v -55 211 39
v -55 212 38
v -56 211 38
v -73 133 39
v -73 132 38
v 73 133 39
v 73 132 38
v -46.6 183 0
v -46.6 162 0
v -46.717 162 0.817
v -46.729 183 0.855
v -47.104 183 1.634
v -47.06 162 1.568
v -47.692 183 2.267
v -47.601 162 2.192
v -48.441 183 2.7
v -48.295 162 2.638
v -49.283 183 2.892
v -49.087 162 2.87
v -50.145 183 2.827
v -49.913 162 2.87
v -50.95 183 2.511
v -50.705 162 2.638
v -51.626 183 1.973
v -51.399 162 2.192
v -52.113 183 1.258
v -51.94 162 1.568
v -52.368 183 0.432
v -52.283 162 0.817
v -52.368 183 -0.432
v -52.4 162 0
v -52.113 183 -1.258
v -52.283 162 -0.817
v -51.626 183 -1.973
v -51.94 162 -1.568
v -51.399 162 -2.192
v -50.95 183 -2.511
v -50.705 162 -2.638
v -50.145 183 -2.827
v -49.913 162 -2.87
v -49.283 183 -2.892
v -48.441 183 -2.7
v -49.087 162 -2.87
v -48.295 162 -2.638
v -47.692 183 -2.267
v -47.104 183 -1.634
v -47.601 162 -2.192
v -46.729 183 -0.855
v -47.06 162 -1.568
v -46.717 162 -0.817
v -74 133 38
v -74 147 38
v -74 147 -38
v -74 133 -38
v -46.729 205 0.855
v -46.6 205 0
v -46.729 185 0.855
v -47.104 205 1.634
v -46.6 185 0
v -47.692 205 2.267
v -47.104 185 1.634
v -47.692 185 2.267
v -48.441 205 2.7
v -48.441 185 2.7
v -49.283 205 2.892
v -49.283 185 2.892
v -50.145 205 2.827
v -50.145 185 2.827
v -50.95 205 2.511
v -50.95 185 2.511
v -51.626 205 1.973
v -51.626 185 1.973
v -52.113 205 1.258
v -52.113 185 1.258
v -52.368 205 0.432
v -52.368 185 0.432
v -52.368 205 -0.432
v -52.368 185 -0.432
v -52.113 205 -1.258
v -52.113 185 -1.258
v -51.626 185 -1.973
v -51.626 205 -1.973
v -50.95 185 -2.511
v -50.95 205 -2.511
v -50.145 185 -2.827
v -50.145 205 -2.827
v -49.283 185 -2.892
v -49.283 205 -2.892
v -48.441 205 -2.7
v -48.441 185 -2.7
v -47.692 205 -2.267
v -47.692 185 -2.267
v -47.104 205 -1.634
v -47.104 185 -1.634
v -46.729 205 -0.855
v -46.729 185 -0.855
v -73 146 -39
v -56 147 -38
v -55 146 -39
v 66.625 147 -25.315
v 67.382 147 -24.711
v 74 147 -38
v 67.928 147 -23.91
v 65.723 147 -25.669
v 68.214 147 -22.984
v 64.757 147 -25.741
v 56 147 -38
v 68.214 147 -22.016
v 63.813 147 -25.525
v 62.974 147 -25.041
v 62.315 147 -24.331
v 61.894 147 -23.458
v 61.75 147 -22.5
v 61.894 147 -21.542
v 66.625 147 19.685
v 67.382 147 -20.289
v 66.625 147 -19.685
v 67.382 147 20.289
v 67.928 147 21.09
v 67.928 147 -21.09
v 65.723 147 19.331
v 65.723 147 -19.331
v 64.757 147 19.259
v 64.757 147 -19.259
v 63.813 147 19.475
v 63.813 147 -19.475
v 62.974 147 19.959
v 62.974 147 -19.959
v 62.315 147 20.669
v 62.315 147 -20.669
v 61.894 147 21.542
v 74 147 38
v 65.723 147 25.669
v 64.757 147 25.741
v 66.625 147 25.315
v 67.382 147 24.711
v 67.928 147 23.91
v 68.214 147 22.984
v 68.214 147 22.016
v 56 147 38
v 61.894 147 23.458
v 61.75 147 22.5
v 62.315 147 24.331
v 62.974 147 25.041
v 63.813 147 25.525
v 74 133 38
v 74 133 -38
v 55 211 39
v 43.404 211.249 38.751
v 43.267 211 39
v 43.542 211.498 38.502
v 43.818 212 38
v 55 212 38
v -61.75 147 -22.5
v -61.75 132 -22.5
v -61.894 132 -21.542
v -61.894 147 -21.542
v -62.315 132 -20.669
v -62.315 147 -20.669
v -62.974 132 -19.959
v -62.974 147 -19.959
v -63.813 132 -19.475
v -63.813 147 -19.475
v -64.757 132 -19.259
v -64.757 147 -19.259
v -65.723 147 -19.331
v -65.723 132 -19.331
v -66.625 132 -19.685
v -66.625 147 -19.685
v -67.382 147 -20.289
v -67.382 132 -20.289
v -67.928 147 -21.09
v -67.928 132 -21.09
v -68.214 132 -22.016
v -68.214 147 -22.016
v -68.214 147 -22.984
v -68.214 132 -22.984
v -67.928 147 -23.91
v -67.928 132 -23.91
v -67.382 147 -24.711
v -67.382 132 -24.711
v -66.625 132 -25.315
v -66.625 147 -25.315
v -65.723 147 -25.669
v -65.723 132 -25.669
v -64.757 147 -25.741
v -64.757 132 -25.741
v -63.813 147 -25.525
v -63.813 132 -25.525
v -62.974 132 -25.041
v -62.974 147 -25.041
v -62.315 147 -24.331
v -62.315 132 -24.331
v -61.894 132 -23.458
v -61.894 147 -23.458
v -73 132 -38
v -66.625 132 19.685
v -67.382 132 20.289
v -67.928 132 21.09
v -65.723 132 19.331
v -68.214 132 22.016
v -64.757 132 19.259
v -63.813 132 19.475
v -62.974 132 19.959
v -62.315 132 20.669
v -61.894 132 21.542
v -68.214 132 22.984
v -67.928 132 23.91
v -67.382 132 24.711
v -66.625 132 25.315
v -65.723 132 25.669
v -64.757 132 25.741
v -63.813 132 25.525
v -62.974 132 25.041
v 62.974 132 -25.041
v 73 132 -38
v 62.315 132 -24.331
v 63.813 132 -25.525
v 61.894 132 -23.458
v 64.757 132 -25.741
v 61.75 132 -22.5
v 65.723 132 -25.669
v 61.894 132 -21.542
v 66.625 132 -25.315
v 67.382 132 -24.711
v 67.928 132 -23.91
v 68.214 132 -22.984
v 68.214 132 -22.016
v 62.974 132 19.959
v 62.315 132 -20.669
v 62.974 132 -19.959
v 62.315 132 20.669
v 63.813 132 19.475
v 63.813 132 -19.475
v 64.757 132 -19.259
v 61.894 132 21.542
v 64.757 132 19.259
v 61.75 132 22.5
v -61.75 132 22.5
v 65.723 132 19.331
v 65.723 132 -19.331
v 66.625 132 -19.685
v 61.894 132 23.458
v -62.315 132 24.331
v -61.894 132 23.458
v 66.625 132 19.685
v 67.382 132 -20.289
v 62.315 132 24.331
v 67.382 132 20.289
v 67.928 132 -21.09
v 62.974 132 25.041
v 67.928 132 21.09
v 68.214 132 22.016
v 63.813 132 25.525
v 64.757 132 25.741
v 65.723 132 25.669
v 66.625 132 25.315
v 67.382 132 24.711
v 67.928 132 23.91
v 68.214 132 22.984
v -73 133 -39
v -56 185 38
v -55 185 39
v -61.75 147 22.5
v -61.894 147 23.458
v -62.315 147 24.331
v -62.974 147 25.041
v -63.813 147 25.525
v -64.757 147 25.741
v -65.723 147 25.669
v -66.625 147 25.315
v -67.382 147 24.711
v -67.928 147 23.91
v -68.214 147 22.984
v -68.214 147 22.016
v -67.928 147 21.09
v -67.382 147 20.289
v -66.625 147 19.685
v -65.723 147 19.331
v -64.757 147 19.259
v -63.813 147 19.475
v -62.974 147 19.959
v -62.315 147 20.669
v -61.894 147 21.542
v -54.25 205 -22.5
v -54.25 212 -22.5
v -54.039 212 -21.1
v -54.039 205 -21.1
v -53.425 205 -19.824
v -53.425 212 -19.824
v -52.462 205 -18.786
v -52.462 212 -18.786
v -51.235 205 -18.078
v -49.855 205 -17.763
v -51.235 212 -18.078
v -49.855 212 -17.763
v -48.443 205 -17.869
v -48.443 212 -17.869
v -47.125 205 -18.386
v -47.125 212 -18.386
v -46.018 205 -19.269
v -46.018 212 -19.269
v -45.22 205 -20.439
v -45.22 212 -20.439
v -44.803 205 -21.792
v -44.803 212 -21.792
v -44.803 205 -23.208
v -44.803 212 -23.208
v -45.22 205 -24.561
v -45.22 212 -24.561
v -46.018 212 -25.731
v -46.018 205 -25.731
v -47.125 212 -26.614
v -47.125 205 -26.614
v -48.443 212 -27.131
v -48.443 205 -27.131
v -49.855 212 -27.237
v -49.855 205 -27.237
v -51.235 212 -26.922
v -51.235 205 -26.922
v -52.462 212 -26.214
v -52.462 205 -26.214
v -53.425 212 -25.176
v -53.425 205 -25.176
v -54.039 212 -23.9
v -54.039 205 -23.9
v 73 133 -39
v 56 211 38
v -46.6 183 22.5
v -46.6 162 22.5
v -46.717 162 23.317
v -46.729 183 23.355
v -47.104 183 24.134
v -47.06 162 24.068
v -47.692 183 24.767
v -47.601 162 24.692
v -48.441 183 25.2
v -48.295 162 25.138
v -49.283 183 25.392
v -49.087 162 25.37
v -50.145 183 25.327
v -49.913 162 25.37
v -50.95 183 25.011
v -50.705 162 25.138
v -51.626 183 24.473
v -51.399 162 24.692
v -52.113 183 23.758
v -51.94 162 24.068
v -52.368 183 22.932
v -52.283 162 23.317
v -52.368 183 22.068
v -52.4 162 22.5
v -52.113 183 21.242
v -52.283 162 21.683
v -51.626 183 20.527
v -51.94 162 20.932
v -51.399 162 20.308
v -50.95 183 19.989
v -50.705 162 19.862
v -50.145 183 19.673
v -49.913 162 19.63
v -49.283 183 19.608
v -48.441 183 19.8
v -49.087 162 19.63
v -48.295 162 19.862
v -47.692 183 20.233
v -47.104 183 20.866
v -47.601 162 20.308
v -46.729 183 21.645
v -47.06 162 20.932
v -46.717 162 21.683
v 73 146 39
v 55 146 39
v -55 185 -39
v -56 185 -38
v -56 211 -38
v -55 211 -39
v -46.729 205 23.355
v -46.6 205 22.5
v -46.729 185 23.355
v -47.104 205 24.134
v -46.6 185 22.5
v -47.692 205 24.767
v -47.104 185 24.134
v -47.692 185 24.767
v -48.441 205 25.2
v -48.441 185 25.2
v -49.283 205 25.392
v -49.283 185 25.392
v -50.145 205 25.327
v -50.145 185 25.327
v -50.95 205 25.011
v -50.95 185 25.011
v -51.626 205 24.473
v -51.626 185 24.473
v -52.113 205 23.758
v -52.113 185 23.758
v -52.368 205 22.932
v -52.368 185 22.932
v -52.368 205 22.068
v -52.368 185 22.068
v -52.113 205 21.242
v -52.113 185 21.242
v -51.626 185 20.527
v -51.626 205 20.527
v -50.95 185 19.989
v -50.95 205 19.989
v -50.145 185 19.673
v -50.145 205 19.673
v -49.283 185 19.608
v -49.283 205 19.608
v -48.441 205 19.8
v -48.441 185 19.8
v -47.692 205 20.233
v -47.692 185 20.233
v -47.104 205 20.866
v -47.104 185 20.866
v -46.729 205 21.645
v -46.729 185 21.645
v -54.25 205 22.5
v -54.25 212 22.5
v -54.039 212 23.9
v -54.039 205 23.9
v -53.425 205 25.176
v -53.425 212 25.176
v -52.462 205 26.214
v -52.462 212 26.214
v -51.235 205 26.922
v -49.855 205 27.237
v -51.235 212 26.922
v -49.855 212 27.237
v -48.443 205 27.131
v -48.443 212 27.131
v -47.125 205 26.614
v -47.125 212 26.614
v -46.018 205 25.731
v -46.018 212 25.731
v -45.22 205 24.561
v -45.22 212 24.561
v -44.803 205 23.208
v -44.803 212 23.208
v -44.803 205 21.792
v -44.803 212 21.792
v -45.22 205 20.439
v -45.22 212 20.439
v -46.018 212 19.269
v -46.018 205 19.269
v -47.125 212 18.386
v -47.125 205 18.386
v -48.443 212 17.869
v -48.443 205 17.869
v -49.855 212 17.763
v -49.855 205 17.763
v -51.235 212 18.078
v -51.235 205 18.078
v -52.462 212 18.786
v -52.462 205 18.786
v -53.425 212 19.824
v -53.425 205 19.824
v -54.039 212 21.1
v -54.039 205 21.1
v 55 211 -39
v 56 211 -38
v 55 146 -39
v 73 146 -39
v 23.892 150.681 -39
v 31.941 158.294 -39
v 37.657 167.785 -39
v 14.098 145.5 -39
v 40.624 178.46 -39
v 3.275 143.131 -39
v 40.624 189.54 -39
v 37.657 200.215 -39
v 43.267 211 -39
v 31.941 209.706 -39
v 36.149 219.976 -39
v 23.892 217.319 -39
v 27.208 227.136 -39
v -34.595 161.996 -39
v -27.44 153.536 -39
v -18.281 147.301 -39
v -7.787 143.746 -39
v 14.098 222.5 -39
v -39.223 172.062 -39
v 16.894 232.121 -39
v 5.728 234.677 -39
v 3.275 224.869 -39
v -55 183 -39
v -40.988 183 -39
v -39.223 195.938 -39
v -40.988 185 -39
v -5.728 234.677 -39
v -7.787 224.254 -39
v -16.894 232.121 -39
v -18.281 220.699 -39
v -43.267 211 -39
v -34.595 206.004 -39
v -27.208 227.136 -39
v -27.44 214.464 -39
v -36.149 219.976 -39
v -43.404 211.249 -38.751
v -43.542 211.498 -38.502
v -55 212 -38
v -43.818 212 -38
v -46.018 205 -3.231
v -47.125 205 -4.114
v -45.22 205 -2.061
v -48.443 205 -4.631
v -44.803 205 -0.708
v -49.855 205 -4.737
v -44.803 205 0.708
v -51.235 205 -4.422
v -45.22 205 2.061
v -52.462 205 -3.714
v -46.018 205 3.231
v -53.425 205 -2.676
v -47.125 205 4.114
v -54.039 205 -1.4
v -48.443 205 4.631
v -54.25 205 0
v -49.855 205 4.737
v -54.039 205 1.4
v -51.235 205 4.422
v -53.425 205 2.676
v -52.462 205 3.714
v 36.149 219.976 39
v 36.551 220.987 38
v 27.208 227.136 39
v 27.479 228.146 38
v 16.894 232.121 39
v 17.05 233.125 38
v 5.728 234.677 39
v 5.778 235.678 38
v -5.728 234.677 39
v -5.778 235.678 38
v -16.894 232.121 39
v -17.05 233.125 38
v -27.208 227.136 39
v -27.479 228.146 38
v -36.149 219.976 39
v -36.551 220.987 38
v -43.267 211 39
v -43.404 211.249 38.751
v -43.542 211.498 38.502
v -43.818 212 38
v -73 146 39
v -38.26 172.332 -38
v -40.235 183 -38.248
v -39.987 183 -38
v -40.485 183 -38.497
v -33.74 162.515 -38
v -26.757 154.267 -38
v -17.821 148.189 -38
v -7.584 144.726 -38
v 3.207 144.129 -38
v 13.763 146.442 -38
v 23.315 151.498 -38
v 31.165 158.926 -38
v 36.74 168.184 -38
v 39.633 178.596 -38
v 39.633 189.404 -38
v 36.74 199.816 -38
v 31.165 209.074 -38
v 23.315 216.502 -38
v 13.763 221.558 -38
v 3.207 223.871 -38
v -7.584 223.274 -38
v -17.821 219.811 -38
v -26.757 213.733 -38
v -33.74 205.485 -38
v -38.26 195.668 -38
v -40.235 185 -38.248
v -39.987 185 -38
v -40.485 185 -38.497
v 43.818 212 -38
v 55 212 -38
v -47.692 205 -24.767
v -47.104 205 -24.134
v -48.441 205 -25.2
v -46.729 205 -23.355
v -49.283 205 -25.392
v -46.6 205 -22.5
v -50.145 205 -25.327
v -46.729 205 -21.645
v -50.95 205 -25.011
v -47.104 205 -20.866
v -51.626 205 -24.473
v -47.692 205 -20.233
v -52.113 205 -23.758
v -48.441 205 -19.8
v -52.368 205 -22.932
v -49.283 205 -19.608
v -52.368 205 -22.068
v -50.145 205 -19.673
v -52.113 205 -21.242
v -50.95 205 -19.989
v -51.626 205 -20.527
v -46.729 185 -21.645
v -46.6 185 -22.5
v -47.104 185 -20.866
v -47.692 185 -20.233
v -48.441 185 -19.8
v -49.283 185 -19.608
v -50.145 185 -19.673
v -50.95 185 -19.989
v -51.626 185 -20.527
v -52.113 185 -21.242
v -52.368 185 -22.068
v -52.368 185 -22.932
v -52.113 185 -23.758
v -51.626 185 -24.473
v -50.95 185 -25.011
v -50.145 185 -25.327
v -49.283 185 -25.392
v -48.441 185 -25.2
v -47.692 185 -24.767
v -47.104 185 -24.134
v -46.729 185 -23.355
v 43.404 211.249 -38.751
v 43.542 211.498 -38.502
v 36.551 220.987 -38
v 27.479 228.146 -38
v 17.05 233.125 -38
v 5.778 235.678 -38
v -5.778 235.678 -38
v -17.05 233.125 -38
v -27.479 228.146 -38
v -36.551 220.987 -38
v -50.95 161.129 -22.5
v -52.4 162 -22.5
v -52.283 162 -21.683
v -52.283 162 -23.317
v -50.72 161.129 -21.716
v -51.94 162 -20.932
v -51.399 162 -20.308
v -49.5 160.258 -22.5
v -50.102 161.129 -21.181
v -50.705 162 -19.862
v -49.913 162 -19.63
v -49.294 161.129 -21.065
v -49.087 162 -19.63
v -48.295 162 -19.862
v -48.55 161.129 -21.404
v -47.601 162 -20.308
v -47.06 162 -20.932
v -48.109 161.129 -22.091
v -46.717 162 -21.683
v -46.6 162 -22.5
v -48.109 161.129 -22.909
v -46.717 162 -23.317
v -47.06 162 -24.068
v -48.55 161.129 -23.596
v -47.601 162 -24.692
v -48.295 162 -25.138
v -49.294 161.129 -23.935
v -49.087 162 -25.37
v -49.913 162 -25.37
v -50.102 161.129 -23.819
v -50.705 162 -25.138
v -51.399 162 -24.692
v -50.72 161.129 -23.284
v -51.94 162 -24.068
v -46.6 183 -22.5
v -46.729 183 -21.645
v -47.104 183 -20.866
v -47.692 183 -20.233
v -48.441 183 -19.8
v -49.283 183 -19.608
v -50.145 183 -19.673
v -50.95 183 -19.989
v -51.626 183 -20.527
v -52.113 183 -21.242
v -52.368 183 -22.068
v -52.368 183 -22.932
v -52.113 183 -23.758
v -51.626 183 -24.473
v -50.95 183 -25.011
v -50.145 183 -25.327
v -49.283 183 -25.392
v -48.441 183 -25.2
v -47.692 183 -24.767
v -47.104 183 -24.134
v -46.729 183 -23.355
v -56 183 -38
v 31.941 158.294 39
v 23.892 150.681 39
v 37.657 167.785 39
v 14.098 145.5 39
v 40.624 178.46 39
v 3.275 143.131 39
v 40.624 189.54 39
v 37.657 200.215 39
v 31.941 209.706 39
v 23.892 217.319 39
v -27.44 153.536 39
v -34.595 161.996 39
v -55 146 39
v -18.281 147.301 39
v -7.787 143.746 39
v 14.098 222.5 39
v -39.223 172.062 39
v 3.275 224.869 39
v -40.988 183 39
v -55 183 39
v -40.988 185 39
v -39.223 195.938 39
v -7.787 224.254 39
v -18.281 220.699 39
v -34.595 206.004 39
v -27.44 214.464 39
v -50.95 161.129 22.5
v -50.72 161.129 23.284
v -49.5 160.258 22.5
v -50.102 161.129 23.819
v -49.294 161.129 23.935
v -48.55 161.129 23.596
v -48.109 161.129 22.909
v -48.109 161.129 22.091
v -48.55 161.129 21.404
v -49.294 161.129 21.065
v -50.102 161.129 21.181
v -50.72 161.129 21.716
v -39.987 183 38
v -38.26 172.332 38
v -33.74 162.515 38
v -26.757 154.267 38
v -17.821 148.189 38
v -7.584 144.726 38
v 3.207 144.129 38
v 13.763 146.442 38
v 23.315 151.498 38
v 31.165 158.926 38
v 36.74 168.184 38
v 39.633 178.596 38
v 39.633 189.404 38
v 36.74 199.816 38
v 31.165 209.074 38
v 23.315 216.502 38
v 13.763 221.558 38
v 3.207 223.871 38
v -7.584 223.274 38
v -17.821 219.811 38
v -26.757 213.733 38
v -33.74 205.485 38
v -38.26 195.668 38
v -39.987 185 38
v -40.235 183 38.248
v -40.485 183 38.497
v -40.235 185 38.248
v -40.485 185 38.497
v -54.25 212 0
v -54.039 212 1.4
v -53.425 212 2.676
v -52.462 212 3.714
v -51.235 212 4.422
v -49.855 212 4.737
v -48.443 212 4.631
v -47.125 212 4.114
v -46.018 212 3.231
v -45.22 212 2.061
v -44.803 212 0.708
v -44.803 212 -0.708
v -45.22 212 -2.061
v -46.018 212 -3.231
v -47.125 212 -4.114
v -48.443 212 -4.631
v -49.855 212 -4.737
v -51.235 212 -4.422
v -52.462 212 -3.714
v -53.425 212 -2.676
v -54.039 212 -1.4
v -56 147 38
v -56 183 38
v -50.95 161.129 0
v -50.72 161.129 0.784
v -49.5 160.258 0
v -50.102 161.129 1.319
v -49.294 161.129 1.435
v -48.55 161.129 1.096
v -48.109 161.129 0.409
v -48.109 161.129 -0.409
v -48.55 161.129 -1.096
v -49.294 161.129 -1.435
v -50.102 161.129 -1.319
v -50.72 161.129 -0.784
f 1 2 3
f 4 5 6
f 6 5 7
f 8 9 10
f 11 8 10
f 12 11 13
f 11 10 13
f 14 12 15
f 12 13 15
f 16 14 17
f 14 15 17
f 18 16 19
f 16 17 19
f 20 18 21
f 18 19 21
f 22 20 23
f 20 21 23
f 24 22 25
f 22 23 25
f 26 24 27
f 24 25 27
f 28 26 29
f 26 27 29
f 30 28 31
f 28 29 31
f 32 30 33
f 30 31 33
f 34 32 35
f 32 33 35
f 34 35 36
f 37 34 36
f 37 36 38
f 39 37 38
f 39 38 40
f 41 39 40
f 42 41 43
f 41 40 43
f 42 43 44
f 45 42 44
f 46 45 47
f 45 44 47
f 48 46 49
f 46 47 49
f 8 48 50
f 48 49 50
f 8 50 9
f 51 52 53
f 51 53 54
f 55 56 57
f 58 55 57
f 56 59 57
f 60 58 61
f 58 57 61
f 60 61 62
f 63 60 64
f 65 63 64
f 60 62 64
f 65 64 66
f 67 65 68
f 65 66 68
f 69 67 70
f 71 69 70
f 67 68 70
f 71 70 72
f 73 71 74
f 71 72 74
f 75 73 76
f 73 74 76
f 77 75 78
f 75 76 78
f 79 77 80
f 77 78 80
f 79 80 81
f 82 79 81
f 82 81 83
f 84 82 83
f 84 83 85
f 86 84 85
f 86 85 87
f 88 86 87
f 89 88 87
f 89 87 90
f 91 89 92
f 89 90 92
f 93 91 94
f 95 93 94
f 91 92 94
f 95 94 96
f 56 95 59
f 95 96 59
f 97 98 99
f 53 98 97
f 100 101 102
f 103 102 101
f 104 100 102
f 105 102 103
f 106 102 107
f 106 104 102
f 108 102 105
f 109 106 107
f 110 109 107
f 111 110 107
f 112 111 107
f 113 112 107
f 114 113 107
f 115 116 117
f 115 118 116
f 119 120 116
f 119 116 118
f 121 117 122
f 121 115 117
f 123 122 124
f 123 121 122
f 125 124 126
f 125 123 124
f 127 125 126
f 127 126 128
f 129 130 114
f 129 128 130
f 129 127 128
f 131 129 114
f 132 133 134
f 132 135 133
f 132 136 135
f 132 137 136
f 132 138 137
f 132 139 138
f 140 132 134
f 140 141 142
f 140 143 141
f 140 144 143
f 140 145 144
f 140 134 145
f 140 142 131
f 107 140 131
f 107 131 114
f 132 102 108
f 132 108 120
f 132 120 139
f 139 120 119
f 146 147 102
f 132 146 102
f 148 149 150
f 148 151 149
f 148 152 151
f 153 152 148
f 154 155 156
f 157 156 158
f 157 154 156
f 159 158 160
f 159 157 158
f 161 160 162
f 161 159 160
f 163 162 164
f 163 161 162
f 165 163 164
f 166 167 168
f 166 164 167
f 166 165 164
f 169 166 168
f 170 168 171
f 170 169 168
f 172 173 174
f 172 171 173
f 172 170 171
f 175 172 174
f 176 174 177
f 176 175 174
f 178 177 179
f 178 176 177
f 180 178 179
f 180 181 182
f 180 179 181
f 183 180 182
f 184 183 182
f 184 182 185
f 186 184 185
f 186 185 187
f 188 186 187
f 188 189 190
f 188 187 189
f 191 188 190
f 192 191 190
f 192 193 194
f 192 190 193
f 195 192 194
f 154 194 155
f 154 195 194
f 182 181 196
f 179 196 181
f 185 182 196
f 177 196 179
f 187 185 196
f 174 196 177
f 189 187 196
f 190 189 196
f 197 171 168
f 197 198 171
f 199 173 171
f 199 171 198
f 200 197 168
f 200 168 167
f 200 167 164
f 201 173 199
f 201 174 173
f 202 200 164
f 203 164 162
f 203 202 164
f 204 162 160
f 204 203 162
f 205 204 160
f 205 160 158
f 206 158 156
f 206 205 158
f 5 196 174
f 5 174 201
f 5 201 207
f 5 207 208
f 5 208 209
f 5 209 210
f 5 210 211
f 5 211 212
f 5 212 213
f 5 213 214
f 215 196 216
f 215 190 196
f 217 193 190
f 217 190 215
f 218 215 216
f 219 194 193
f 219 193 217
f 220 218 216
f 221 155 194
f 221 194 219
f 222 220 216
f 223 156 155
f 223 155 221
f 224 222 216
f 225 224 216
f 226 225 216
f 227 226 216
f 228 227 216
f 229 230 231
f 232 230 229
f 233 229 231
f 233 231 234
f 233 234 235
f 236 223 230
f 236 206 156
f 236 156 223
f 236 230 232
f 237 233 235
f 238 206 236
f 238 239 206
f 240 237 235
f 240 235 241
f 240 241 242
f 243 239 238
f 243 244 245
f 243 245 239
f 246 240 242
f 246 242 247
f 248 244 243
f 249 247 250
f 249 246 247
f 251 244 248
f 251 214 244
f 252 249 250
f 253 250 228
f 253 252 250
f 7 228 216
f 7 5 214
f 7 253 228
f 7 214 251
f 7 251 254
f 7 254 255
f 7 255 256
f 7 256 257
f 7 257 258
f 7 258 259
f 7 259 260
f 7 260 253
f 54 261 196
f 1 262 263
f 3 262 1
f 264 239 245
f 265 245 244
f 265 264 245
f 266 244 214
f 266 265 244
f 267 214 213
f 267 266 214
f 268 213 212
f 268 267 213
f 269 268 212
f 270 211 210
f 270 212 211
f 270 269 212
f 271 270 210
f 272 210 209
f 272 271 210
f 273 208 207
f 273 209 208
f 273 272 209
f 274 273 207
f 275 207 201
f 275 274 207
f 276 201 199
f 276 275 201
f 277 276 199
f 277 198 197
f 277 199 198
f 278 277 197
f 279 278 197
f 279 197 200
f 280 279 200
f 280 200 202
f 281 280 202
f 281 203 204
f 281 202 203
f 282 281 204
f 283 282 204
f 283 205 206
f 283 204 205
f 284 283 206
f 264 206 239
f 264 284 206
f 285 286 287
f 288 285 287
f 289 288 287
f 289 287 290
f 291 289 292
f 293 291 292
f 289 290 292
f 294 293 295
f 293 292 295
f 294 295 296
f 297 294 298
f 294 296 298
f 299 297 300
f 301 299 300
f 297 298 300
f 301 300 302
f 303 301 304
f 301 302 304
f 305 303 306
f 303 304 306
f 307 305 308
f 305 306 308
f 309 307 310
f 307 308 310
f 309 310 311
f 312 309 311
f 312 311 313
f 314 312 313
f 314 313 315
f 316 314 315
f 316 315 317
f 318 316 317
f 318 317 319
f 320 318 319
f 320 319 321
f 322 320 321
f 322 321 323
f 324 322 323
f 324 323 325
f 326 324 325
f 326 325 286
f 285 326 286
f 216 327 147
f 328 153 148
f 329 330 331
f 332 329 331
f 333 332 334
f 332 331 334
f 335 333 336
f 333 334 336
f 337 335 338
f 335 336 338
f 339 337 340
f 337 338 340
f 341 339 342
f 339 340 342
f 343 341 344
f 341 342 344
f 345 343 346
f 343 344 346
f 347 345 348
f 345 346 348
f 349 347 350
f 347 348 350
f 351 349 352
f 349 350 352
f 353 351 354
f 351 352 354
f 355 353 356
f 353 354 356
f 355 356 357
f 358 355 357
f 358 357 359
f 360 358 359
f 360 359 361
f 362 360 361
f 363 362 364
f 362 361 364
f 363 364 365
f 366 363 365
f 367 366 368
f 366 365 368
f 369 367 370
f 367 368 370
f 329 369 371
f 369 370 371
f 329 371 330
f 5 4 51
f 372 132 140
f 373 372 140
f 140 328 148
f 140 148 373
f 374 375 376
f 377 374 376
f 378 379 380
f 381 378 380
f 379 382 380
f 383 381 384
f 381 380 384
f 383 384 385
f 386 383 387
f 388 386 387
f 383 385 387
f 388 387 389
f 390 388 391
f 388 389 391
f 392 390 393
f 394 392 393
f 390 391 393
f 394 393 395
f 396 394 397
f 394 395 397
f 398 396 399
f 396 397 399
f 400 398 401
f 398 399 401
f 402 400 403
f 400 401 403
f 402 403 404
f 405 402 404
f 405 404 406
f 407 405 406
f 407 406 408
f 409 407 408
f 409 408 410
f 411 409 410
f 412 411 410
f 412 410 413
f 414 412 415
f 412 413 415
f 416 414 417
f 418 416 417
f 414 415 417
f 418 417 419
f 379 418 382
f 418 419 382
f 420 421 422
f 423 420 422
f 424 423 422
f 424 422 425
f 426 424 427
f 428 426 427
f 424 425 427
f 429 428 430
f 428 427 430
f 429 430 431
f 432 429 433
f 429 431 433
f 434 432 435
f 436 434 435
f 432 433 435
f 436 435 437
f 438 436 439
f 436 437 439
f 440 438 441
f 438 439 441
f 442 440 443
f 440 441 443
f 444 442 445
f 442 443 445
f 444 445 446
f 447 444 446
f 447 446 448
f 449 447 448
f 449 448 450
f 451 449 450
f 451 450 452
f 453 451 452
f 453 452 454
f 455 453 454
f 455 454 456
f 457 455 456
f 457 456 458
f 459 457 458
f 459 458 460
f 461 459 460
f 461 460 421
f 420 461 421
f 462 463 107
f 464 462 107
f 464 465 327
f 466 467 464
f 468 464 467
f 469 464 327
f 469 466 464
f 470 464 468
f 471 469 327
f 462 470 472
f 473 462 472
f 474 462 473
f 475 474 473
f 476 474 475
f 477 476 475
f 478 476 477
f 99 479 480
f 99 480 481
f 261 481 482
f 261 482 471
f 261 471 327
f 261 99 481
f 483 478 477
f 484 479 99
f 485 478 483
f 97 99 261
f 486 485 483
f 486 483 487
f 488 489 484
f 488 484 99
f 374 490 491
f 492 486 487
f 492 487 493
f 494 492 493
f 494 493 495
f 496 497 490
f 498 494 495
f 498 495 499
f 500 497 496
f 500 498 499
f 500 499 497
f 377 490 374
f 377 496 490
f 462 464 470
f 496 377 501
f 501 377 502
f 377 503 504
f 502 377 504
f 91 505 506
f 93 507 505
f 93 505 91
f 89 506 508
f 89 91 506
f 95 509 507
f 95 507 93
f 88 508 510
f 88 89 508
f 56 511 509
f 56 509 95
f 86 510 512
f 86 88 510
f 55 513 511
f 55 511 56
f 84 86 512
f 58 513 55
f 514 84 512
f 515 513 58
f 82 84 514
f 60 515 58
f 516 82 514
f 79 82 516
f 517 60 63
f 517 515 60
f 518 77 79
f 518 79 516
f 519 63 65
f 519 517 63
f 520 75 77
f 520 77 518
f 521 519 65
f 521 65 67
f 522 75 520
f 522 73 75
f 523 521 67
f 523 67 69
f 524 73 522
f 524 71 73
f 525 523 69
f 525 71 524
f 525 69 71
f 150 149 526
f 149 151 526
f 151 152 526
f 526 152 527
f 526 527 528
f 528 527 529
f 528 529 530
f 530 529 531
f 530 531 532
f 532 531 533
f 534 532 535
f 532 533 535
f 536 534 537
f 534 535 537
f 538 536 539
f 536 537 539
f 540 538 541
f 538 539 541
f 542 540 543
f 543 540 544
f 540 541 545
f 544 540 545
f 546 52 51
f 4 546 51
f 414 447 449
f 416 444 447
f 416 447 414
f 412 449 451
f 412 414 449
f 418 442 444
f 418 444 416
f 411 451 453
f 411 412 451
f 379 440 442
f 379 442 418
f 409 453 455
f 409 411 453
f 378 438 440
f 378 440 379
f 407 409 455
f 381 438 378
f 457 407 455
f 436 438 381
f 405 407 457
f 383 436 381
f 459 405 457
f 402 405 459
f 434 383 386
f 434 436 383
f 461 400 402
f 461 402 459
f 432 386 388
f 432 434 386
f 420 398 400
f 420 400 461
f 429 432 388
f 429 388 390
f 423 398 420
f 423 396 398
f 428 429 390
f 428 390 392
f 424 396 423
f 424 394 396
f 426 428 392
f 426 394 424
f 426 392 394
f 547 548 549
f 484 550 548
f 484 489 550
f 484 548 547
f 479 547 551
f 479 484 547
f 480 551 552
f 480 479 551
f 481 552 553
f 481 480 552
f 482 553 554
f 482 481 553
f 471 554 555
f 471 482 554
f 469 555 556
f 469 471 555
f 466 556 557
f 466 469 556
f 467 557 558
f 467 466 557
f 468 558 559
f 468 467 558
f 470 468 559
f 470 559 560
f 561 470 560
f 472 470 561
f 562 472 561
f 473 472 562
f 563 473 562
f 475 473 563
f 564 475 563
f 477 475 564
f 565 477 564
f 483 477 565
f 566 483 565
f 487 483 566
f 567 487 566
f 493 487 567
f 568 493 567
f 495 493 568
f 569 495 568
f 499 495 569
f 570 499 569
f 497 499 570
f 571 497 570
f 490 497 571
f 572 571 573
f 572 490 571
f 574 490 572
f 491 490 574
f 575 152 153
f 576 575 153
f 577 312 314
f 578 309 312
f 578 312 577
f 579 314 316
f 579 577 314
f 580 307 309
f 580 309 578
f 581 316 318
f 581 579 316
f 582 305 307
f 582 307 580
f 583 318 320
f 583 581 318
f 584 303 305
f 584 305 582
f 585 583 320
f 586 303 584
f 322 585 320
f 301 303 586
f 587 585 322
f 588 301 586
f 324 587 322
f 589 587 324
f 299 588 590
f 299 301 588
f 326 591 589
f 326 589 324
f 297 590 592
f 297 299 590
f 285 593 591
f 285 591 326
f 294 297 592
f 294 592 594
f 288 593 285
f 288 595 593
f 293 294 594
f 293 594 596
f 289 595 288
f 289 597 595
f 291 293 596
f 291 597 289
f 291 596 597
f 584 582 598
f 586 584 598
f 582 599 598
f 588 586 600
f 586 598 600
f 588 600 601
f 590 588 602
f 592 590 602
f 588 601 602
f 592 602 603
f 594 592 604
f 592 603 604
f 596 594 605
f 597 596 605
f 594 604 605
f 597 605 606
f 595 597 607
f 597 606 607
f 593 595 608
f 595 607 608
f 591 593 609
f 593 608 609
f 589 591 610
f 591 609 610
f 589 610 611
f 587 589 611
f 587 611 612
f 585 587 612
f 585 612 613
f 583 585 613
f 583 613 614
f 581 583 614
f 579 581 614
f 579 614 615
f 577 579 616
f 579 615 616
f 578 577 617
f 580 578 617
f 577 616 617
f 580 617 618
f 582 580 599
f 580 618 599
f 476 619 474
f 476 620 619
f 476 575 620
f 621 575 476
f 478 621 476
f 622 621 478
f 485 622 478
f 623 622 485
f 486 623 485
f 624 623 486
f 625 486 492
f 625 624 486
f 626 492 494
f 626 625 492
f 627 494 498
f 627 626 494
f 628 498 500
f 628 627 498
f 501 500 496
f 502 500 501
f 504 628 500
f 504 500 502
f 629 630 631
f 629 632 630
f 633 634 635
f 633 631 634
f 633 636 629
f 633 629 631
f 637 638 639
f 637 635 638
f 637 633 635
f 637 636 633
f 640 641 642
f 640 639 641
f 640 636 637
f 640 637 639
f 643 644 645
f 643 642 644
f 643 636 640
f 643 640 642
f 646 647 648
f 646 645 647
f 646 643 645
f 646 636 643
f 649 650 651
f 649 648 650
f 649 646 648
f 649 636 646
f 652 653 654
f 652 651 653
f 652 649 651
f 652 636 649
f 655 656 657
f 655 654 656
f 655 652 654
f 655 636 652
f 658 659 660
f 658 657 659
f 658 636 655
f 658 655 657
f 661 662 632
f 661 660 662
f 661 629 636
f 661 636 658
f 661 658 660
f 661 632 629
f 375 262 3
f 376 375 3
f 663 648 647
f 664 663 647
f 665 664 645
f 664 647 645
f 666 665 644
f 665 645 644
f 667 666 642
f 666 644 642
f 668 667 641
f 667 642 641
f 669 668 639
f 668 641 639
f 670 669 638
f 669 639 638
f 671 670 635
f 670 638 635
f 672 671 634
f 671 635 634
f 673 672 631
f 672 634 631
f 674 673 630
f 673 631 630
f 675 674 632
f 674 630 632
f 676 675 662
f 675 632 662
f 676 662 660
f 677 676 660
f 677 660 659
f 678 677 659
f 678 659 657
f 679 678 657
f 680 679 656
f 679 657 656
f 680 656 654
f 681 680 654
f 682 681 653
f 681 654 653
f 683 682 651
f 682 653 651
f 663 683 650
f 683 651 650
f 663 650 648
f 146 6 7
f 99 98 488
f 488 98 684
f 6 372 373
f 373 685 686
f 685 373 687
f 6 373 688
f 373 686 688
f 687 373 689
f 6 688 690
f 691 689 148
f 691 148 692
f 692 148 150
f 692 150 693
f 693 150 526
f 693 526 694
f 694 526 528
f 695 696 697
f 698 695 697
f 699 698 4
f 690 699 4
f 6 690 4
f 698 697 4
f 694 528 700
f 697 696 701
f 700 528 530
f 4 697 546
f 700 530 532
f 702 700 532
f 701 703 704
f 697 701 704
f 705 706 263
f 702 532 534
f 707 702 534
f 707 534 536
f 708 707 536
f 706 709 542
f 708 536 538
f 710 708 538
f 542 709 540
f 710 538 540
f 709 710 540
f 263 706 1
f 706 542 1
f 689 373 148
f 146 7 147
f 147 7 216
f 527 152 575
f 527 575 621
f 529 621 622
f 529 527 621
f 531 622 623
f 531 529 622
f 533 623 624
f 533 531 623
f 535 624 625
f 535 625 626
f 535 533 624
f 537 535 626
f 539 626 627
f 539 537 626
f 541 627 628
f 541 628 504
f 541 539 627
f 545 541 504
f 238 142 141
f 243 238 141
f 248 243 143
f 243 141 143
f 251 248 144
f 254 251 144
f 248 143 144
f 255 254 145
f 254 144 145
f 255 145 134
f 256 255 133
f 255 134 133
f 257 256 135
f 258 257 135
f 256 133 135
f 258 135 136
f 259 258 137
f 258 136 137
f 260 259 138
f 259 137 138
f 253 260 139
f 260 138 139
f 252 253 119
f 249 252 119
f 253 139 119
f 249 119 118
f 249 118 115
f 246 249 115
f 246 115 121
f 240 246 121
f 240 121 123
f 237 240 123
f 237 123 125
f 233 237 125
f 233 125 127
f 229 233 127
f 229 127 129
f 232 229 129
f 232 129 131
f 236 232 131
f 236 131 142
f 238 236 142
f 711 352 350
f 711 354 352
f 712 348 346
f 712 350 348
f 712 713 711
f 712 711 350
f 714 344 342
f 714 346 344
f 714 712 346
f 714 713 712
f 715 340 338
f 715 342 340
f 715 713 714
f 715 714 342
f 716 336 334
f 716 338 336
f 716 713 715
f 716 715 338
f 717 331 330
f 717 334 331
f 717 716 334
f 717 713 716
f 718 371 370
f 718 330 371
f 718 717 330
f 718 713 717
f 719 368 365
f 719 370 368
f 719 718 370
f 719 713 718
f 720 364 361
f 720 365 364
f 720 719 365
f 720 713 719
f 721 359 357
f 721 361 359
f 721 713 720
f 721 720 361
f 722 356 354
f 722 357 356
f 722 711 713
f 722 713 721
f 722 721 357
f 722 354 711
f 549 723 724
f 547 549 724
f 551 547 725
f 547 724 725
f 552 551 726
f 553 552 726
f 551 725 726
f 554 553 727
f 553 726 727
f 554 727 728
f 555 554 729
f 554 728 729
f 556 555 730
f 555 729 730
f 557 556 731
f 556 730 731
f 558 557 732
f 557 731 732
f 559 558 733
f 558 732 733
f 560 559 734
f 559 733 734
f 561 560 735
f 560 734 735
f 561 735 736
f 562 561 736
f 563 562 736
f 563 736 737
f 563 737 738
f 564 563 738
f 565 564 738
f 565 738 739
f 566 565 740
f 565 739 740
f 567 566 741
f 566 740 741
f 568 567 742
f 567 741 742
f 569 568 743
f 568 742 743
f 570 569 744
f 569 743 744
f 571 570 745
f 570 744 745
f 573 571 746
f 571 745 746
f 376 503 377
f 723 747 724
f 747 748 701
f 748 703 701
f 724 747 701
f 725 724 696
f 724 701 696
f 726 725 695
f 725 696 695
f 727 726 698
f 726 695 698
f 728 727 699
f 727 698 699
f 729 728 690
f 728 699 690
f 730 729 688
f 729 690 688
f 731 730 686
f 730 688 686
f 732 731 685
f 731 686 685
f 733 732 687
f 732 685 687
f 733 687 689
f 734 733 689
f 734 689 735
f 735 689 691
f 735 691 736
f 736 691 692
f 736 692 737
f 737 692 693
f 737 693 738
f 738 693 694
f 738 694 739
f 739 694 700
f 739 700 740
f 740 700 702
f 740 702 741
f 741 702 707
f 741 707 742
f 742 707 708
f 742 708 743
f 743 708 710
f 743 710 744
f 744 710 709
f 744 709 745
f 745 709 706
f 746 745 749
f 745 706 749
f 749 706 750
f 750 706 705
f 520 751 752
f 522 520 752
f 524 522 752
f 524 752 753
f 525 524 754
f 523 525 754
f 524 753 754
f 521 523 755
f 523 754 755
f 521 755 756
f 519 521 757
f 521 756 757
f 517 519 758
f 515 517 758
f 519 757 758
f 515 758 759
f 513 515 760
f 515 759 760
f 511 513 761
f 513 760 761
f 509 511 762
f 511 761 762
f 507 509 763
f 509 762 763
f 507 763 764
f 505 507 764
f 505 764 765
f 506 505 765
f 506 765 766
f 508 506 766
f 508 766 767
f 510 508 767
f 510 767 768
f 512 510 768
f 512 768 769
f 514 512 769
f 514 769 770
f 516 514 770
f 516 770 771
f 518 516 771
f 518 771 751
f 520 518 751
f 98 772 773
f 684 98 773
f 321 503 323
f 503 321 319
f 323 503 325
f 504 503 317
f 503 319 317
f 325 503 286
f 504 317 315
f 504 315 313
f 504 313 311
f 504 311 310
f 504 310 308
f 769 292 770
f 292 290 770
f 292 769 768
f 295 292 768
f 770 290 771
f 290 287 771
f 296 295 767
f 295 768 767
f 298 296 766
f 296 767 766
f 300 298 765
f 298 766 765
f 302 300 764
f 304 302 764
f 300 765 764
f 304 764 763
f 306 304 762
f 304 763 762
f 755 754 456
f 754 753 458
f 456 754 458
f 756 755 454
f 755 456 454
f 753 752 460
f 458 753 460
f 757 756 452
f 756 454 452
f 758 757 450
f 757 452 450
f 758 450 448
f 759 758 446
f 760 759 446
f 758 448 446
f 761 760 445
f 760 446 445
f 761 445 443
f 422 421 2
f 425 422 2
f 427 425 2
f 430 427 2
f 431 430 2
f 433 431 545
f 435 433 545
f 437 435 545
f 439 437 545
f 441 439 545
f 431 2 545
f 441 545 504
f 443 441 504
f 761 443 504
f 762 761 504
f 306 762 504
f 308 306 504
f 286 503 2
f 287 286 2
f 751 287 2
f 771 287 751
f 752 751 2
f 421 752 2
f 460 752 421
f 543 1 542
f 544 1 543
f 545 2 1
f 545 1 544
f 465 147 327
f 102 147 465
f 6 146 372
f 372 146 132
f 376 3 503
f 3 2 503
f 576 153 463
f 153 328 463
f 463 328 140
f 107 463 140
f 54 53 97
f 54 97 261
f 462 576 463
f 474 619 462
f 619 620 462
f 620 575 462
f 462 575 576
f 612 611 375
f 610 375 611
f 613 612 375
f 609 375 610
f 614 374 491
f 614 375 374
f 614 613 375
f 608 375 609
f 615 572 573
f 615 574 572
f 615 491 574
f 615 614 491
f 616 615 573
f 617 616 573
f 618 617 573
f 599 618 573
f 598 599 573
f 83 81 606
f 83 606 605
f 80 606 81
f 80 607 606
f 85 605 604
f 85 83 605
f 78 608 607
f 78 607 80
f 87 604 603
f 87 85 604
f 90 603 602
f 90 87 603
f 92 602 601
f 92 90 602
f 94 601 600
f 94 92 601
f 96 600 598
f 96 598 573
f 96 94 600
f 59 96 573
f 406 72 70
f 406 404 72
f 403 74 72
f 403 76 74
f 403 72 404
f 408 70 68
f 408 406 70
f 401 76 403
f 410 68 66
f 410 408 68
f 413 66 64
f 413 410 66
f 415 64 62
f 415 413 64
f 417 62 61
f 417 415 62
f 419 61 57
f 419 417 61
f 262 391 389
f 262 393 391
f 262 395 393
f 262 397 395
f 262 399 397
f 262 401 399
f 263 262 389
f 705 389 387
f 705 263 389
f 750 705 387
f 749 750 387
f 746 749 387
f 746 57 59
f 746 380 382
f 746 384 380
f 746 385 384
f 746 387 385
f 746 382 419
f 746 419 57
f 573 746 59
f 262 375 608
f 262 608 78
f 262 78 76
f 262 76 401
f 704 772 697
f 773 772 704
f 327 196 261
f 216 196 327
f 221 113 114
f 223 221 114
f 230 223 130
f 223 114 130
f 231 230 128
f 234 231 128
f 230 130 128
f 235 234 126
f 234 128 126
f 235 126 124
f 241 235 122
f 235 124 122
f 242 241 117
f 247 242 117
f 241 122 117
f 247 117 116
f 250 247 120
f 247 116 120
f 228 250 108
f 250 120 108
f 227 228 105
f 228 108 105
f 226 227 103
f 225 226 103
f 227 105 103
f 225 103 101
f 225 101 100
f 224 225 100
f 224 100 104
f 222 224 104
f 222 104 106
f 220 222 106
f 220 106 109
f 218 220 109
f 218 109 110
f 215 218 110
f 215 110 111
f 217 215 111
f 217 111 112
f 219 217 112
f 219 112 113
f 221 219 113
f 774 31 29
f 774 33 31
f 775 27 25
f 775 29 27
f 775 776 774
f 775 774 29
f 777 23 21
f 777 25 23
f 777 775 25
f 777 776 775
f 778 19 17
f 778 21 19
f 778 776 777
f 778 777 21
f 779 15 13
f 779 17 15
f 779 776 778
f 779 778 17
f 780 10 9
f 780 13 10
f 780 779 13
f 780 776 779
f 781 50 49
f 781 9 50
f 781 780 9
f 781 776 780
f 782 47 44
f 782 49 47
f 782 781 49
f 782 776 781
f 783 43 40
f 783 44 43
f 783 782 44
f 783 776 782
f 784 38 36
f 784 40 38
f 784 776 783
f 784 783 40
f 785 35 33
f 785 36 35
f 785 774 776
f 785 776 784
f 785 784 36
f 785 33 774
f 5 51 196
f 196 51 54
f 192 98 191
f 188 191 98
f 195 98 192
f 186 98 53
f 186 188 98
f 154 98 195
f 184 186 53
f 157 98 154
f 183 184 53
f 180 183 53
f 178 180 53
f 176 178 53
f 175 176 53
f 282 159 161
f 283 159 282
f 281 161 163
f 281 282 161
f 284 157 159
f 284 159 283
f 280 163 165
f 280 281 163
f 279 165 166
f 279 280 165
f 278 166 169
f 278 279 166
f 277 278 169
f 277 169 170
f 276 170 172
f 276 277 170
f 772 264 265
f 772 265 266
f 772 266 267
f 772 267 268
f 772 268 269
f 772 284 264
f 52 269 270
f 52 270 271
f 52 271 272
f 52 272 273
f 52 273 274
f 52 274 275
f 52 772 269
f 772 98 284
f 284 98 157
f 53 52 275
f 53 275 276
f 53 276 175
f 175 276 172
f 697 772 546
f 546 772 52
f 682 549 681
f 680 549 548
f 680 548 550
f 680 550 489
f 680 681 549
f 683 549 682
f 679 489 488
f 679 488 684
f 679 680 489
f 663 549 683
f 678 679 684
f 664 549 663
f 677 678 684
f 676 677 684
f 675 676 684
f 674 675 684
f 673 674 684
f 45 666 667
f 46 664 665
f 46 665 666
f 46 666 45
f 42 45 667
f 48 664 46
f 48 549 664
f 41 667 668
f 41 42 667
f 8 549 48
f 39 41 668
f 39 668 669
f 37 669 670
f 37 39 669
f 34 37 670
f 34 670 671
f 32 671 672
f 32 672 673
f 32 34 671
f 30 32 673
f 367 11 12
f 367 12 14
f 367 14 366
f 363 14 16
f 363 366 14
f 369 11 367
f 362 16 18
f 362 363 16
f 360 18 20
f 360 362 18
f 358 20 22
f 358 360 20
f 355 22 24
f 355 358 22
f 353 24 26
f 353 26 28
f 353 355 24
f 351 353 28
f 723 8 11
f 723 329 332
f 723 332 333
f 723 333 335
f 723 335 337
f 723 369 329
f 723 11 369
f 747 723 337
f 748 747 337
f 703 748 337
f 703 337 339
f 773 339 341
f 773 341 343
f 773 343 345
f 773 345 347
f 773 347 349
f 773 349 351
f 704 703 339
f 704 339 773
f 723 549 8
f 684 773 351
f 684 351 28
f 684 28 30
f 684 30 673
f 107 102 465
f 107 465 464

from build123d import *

# Parameters (mm, degrees)
PAD013_DEPTH            = 39
HOLE004_D               = 5.8
HOLE004_DEPTH           = 50
HOLE004_CBORE_D         = 9.5
HOLE004_CBORE_DEPTH     = 7
HOLE004_TIPS_R          = 2.9
CHAMFER003_SIZE         = 1
SKETCH021_R             = 3.25
POCKET003_DEPTH         = 408.975618
BODY005_PLACEMENT_ANGLE = 270


with BuildPart() as part:
    # Sketch019 → Pad013 (new body, symmetric)
    with BuildSketch(Plane.XZ):
        with BuildLine():
            ThreePointArc((-39.987498, -1), (40, 0), (-39.987498, 1))
            Line((-56, 1), (-39.987498, 1))
            Line((-56, 1), (-56, 28))
            Line((-56, 28), (-43.817805, 28))
            ThreePointArc((43.817805, 28), (0, 52), (-43.817805, 28))
            Line((43.817805, 28), (56, 28))
            Line((56, 28), (56, -37))
            Line((74, -37), (56, -37))
            Line((74, -52), (74, -37))
            Line((-74, -52), (74, -52))
            Line((-74, -37), (-74, -52))
            Line((-56, -37), (-74, -37))
            Line((-56, -37), (-56, -1))
            Line((-39.987498, -1), (-56, -1))
        make_face()
    extrude(amount=PAD013_DEPTH, both=True)

    # Hole004
    with Locations(Plane(origin=(0, 0, 28), x_dir=(-1, 0, 0), z_dir=(0, 0, 1))):
        with Locations((49.5, 22.5), (49.5, 0), (49.5, -22.5)):
            CounterBoreHole(HOLE004_D / 2, HOLE004_CBORE_D / 2, HOLE004_CBORE_DEPTH, depth=HOLE004_DEPTH)

    # Hole004 tips → Hole004 tip 1 section 0
    with BuildSketch(Plane(origin=(0, 0, -22), x_dir=(-1, 0, 0), z_dir=(0, 0, 1)), mode=Mode.PRIVATE) as hole004_tip_1_s0:
        with Locations((49.5, 22.5)):
            Circle(HOLE004_TIPS_R)
    loft([hole004_tip_1_s0.sketch, Vertex(-49.5, -22.5, -23.742496)], mode=Mode.SUBTRACT)

    # Hole004 tips → Hole004 tip 2 section 0
    with BuildSketch(Plane(origin=(0, 0, -22), x_dir=(-1, 0, 0), z_dir=(0, 0, 1)), mode=Mode.PRIVATE) as hole004_tip_2_s0:
        with Locations((49.5, 0)):
            Circle(HOLE004_TIPS_R)
    loft([hole004_tip_2_s0.sketch, Vertex(-49.5, 0, -23.742496)], mode=Mode.SUBTRACT)

    # Hole004 tips → Hole004 tip 3 section 0
    with BuildSketch(Plane(origin=(0, 0, -22), x_dir=(-1, 0, 0), z_dir=(0, 0, 1)), mode=Mode.PRIVATE) as hole004_tip_3_s0:
        with Locations((49.5, -22.5)):
            Circle(HOLE004_TIPS_R)
    loft([hole004_tip_3_s0.sketch, Vertex(-49.5, 22.5, -23.742496)], mode=Mode.SUBTRACT)

    # Chamfer003
    chamfer003_edges = [part.edges().sort_by_distance(p)[0] for p in [
        (40, 39, 0),
        (0, 39, 52),
        (-49.908902, 39, 28),
        (-56, 0, 28),
        (49.908902, 39, 28),
        (56, 0, 28),
        (-56, 39, 14.5),
        (-56, 39, -19),
        (-65, 39, -37),
        (-74, 39, -44.5),
        (0, 39, -52),
        (74, 39, -44.5),
        (65, 39, -37),
        (56, 39, -4.5),
        (40, -39, 0),
        (0, -39, 52),
        (-49.908902, -39, 28),
        (49.908902, -39, 28),
        (56, -39, -4.5),
        (65, -39, -37),
        (74, -39, -44.5),
        (0, -39, -52),
        (-74, -39, -44.5),
        (-65, -39, -37),
        (-56, -39, -19),
        (-56, -39, 14.5),
        (-74, 0, -52),
        (74, 0, -52),
    ]]
    chamfer(chamfer003_edges, length=CHAMFER003_SIZE)

    # Sketch021 (on Face54 of Chamfer003) → Pocket003 (cut, through all)
    with BuildSketch(Plane(origin=(0, 0, -37), x_dir=(-1, 0, 0), z_dir=(0, 0, 1))):
        with Locations((-65, 22.5)):
            Circle(SKETCH021_R)
        with Locations((-65, -22.5)):
            Circle(SKETCH021_R)
    pocket003 = extrude(amount=-POCKET003_DEPTH, mode=Mode.SUBTRACT)

    # Mirrored002: Pocket003 across YZ
    add(pocket003.mirror(Plane.YZ), mode=Mode.SUBTRACT)


with BuildPart() as part_1:
    # Body005 placement: moved
    add(part.part.moved(Location((0, 184, 0))).rotate(Axis((0, 184, 0), (1, 0, 0)), BODY005_PLACEMENT_ANGLE))


solid = part_1.part
